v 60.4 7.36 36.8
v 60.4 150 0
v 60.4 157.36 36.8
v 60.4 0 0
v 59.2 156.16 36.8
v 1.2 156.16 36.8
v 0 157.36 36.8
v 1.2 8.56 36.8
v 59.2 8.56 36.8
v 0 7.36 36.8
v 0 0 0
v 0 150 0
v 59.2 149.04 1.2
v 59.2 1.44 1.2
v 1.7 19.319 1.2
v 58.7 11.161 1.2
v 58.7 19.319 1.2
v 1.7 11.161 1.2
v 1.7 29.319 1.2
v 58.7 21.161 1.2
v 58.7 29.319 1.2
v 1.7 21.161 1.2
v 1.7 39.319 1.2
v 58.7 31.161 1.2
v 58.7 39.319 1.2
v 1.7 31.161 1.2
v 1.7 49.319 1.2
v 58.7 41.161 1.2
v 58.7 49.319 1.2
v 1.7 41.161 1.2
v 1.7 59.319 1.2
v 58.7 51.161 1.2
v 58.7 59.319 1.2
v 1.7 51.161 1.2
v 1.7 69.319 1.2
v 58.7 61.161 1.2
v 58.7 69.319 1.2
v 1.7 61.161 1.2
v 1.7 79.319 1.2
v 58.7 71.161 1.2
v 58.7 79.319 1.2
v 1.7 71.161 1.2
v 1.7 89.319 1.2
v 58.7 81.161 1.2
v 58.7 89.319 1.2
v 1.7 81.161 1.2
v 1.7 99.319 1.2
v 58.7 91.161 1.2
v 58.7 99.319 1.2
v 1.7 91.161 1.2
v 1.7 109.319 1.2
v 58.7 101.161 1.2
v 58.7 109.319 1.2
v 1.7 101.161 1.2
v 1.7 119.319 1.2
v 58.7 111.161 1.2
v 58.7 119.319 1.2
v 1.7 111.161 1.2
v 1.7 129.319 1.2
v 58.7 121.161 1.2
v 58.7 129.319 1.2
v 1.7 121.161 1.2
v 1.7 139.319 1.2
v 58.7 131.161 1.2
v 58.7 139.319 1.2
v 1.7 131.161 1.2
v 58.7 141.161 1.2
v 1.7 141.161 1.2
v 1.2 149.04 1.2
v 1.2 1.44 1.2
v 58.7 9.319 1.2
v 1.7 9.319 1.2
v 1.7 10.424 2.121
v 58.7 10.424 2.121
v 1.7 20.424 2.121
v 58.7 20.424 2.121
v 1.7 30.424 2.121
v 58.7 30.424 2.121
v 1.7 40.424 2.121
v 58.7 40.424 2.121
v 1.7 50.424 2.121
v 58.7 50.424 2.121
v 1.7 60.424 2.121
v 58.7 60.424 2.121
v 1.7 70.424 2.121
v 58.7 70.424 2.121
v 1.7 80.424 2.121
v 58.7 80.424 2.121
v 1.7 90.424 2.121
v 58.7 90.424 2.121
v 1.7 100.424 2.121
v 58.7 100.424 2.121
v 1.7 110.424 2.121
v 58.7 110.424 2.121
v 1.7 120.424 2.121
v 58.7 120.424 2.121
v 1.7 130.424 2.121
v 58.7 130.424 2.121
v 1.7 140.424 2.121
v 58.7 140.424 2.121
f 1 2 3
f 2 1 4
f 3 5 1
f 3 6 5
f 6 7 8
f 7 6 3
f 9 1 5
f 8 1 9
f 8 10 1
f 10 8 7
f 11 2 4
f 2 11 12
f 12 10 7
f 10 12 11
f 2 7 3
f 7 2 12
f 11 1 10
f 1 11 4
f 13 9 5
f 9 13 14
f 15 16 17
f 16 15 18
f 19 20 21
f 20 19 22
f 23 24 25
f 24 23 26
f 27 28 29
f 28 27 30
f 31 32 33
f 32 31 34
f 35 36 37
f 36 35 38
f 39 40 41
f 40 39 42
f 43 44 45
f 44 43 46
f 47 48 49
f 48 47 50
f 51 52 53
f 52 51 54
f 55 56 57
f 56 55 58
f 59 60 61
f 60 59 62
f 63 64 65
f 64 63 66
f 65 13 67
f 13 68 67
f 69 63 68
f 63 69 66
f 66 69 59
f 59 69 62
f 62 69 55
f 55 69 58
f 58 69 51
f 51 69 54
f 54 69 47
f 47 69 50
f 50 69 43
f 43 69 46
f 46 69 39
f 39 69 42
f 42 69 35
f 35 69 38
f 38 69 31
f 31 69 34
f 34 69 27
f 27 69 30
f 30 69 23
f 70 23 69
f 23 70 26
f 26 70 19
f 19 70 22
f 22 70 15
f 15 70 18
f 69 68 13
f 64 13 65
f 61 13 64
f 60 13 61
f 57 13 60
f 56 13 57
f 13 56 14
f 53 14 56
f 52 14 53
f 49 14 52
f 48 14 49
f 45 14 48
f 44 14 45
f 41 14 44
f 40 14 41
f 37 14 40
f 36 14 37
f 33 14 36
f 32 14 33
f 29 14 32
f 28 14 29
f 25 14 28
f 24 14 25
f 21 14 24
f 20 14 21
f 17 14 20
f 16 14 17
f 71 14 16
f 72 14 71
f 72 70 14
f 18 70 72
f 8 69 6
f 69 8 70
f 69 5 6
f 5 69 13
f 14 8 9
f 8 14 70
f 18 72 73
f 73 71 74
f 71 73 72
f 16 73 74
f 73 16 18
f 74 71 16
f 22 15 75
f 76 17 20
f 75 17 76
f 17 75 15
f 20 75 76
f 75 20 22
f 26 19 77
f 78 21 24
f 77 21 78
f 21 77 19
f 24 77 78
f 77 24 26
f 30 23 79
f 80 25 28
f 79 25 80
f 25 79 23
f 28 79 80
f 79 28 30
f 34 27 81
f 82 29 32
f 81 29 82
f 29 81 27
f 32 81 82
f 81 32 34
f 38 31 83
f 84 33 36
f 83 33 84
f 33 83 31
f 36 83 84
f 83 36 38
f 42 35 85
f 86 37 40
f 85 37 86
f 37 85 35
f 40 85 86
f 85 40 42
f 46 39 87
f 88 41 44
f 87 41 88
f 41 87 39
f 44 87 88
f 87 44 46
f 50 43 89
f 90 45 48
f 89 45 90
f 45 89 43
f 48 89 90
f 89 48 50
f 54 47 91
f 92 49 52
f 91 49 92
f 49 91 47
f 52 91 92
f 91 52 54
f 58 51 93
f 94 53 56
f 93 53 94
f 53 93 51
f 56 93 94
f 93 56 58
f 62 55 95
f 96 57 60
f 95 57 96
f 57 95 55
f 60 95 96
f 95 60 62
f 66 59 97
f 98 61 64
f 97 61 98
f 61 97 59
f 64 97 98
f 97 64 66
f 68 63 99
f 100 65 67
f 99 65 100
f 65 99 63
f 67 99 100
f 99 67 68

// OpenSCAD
// Boxes to hold #1 coin envelopes.
// I use these for storing and organizing small electronic components.
//
// 2022-08-24 Adrian McCarthy


module coin_envelope_box() {
    envelope_w = 57;
    envelope_h = 89;
    wall_th = 1.2;
    clearance = 1;
    box_w = wall_th + envelope_w + clearance + wall_th;
    box_h = wall_th + 0.4*envelope_h;
    box_d = 150;  // fits Sterilite 6 quart shoebox
    multmatrix([[1, 0, 0, 0],
                [0, 1, 0.2, 0],
                [0, 0, 1, 0]]) {
        difference() {
            cube([box_w, box_d, box_h]);
            translate([wall_th, wall_th, wall_th])
                cube([envelope_w + clearance, box_d - 2*wall_th, box_h]);
        }
        
        // Little ridges in the floor of the box help envelopes
        // stand upright when the box is less than full.
        dy = 10;
        ridge = 1.25*wall_th;
        translate([wall_th + clearance/2, 0, 0]) {
            for (y = [dy:dy:box_d - dy]) {
                translate([0, y, 0]) rotate([45, 0, 0])
                    cube([envelope_w, ridge, ridge]);
            }
        }
    }
}

coin_envelope_box();
